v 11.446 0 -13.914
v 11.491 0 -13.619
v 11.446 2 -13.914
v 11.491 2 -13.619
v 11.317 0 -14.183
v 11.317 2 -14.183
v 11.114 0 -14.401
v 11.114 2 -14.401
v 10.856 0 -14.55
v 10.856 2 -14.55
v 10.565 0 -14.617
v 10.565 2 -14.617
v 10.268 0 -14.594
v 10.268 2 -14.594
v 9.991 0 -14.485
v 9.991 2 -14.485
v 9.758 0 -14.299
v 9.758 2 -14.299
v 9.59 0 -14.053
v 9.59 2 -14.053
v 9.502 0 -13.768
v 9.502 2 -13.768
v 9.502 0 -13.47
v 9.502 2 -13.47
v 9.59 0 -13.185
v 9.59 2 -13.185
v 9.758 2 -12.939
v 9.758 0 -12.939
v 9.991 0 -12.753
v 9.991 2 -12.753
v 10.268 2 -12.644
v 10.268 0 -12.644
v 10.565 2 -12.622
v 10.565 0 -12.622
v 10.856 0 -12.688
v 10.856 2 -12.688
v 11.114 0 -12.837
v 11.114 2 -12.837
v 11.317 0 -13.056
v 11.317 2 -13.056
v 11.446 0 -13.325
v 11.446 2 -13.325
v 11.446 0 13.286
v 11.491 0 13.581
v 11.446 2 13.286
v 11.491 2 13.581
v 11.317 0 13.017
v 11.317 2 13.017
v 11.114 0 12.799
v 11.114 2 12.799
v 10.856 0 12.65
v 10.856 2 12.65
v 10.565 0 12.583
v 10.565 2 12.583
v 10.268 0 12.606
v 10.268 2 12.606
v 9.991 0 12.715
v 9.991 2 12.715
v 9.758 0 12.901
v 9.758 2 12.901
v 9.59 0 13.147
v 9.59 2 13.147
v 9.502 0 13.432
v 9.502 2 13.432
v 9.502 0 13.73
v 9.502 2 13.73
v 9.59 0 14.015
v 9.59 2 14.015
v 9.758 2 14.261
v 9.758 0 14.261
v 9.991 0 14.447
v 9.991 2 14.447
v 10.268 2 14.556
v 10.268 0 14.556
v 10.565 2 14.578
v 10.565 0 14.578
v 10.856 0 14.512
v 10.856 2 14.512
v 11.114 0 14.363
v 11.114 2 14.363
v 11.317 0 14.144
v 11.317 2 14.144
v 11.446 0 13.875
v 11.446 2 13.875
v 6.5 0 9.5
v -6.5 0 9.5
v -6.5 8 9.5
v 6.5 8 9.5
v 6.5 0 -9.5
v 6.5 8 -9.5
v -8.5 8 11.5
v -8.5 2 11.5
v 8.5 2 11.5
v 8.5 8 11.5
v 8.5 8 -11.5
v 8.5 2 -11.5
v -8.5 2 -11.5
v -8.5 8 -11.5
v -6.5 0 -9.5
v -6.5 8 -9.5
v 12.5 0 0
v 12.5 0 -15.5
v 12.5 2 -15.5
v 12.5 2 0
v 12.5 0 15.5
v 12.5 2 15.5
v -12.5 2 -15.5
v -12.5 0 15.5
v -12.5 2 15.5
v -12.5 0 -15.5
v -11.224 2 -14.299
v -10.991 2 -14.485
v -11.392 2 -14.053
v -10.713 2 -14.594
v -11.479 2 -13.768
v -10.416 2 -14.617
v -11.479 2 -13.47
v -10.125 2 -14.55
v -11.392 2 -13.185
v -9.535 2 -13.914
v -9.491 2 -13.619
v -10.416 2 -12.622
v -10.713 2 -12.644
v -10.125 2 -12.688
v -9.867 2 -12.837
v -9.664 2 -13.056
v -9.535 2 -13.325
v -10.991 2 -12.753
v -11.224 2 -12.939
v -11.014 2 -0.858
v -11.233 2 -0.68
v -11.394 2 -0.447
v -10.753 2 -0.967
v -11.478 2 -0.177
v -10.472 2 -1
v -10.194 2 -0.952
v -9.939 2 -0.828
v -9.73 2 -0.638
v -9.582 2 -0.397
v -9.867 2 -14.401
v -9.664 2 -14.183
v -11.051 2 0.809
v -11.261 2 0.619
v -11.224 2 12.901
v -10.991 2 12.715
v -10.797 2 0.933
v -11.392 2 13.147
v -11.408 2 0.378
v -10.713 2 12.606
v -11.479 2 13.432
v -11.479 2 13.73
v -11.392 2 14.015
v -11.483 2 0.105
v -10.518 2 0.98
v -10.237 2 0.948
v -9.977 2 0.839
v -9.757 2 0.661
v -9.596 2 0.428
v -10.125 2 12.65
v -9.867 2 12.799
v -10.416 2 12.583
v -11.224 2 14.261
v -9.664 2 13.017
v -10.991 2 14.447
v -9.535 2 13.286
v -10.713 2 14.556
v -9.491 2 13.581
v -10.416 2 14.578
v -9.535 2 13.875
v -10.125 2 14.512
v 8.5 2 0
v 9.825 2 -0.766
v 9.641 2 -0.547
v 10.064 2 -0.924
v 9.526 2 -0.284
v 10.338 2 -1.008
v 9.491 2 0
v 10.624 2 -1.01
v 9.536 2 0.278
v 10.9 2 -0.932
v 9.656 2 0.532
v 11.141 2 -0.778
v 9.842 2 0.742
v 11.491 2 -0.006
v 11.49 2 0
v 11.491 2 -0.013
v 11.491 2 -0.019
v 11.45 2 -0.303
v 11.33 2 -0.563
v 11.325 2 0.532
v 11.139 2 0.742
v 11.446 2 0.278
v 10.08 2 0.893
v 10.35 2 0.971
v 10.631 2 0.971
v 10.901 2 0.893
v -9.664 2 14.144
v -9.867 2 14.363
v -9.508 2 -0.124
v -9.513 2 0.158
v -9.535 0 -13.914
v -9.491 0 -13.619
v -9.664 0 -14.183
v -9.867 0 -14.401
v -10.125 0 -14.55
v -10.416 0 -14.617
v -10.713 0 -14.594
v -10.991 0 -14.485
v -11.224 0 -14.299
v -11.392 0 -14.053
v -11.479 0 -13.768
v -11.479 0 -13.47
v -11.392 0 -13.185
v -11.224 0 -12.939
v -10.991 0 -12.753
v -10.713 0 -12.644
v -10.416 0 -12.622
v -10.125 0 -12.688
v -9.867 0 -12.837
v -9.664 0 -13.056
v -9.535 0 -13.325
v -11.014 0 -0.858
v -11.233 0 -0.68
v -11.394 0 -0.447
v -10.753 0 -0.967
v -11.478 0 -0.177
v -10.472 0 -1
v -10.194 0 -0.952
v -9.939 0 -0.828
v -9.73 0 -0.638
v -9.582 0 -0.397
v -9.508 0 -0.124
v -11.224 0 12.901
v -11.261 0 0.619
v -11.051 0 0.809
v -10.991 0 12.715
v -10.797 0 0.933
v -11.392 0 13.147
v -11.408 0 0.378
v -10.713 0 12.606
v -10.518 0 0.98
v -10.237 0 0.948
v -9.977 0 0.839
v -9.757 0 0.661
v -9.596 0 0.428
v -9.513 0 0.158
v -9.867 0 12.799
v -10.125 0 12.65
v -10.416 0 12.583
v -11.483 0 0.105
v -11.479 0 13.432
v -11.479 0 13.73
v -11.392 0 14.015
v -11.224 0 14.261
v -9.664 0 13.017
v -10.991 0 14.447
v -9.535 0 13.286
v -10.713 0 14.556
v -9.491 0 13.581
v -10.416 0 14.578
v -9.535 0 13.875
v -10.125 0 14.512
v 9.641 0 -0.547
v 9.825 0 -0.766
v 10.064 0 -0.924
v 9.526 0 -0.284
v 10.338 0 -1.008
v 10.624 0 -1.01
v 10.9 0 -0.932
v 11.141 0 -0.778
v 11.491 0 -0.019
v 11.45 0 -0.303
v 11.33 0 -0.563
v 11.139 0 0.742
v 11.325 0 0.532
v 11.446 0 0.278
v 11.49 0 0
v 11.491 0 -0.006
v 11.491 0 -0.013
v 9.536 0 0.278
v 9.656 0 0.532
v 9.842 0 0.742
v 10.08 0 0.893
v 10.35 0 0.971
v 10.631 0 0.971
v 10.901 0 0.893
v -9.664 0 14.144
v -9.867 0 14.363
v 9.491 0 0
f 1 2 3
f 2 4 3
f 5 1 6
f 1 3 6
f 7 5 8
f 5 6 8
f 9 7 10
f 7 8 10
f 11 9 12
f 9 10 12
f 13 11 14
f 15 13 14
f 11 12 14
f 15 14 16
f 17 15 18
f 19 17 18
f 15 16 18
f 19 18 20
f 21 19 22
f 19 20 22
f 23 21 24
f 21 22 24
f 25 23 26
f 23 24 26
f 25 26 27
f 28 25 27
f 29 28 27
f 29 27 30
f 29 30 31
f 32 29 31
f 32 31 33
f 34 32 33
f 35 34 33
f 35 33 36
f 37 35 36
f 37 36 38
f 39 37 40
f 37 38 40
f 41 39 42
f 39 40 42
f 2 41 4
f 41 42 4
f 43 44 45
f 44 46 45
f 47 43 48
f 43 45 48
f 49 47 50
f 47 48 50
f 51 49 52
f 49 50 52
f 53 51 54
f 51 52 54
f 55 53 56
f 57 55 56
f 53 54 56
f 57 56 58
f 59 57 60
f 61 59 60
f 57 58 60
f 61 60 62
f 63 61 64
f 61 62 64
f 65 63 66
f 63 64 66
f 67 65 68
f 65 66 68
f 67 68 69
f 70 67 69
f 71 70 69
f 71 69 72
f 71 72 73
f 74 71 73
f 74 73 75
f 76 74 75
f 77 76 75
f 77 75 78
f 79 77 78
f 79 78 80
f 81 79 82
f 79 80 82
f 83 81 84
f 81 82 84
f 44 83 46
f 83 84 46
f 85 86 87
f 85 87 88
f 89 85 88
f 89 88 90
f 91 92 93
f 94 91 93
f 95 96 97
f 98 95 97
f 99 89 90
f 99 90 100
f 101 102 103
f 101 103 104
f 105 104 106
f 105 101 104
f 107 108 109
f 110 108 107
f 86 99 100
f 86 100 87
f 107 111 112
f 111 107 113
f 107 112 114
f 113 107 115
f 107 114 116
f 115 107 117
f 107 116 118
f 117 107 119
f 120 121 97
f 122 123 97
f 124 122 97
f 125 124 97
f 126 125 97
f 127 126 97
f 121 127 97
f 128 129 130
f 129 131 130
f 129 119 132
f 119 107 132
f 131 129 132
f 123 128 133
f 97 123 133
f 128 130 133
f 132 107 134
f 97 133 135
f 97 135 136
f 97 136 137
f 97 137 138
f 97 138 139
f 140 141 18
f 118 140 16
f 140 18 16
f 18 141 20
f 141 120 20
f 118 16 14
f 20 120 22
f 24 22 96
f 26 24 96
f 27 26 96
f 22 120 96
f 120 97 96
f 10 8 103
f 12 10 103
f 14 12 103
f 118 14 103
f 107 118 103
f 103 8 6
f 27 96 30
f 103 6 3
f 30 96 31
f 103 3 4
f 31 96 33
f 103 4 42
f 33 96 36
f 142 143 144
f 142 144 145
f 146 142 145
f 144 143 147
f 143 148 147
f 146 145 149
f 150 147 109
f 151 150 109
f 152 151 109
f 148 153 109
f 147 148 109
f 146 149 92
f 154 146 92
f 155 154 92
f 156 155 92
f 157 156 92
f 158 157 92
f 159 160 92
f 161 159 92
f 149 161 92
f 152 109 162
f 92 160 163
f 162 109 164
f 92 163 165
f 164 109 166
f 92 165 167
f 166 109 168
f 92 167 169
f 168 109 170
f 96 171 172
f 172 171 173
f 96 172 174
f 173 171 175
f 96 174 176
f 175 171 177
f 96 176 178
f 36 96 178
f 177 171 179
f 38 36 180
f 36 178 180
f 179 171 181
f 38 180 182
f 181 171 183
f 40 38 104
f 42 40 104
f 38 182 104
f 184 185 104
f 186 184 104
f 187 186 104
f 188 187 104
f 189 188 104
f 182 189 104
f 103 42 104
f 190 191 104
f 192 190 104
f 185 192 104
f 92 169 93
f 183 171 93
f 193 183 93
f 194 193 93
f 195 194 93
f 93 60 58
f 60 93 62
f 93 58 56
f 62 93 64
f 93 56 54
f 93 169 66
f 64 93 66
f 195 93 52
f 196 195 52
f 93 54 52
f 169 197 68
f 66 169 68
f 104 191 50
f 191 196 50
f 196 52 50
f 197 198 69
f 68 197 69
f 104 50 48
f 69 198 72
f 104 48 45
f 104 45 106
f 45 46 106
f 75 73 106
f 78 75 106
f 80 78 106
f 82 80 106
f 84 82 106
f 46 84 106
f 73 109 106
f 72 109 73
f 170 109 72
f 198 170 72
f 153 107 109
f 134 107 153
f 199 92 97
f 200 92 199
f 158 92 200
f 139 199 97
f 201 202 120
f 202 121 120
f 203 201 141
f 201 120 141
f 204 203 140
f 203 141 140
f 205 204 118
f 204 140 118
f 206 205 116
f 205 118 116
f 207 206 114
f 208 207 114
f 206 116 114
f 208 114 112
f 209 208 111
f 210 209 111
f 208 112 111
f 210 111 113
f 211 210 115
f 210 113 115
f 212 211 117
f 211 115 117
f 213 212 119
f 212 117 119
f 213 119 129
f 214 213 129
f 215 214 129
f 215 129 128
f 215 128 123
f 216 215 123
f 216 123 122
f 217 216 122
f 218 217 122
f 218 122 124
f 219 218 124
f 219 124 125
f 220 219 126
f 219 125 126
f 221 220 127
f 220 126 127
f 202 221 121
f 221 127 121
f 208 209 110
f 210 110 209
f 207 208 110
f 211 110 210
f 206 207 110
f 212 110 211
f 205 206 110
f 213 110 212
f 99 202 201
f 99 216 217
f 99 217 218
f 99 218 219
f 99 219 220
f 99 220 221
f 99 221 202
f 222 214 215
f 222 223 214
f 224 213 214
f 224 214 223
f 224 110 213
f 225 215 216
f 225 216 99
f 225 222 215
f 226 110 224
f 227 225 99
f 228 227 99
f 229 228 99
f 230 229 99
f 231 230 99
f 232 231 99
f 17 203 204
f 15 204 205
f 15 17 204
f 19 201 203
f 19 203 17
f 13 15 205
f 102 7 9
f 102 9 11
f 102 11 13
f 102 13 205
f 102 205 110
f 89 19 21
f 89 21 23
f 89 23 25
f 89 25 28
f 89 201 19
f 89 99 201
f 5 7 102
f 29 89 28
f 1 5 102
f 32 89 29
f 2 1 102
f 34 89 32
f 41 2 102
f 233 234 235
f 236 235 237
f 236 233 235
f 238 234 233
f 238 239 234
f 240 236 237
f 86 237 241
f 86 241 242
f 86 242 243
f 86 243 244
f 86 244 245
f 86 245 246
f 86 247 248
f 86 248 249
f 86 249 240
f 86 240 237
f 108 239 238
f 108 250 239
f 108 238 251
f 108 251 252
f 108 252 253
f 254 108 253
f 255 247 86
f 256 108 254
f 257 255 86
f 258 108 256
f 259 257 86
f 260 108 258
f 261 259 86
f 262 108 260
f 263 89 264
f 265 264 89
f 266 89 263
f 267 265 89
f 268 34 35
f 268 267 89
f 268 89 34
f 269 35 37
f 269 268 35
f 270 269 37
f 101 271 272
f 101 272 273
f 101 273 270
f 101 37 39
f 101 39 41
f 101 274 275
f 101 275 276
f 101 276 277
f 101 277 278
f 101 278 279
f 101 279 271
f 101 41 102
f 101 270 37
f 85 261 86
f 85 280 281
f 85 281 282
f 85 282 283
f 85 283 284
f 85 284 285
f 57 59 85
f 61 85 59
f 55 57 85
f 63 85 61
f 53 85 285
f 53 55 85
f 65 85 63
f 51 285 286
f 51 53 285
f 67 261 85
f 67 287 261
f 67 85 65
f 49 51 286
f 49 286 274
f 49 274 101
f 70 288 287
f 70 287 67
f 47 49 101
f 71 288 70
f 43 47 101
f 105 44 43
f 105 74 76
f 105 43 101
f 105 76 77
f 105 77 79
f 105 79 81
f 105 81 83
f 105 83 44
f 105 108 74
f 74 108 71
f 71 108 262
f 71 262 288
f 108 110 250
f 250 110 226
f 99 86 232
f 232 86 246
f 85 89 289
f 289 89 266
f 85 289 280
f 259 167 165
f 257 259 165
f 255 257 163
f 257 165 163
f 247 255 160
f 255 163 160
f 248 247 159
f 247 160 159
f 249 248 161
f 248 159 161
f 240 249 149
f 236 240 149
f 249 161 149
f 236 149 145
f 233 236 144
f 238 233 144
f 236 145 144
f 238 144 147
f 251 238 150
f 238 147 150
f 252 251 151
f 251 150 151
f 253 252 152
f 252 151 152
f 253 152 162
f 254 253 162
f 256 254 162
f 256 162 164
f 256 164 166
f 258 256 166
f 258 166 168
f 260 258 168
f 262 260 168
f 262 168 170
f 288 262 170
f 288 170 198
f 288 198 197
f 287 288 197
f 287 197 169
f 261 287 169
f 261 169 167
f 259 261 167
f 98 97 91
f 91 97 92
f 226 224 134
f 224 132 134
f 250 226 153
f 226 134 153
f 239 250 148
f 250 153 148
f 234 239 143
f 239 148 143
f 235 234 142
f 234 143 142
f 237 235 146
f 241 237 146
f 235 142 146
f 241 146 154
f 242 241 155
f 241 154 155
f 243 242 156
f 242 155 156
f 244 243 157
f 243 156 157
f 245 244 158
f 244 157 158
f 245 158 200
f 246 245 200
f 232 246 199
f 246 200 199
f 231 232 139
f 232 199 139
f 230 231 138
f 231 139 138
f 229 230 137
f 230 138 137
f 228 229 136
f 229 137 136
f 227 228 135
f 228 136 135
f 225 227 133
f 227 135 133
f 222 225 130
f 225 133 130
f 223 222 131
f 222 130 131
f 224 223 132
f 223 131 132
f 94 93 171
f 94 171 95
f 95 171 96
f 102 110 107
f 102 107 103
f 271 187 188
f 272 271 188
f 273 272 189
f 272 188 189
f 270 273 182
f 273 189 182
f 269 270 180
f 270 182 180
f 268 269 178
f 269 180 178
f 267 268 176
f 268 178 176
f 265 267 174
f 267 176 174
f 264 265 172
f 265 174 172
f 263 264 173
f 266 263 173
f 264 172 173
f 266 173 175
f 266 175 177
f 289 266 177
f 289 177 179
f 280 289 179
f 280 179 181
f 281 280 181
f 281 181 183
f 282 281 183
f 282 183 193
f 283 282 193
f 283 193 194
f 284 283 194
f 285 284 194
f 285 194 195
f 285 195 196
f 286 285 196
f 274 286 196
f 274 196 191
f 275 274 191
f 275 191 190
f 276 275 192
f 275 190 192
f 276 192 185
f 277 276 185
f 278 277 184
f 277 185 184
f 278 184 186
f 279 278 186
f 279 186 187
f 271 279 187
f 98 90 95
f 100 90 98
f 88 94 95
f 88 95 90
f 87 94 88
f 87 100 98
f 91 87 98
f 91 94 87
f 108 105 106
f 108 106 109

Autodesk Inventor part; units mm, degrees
ref_plane "YZ Plane" through (0, 0, 0) normal (1, 0, 0) x (0, 1, 0)
ref_plane "XZ Plane" through (0, 0, 0) normal (0, 1, 0) x (-1, 0, 0)
ref_plane "XY Plane" through (0, 0, 0) normal (0, 0, 1) x (1, 0, 0)
sketch "Sketch1" plane through (0, 0, 0) normal (0, 1, 0) x (-1, 0, 0)
  line L0 (-6.5, -9.5) -> (6.5, -9.5)
  line L1 (6.5, -9.5) -> (6.5, 9.5)
  line L2 (6.5, 9.5) -> (-6.5, 9.5)
  line L3 (-6.5, 9.5) -> (-6.5, -9.5)
  line L4 (-6.5, -9.5) -> (6.5, 9.5) construction
  line L5 (6.5, -9.5) -> (-6.5, 9.5) construction
  line L6 (-8.5, -11.5) -> (8.5, -11.5)
  line L7 (8.5, -11.5) -> (8.5, 11.5)
  line L8 (8.5, 11.5) -> (-8.5, 11.5)
  line L9 (-8.5, 11.5) -> (-8.5, -11.5)
  line L10 (-8.5, -11.5) -> (8.5, 11.5) construction
  line L11 (8.5, -11.5) -> (-8.5, 11.5) construction
  point P0 (0, 0)
  dimension "d0" = 13
  dimension "d1" = 19
  dimension "d2" = 17
  dimension "d3" = 23
extrude "Extrusion1" add sketch "Sketch1" along normal blind 8
sketch "Sketch2" plane through (0, 0, 0) normal (0, -1, 0) x (1, 0, 0)
  line L0 (8.5, 11.5) -> (8.5, -11.5) projected
  line L1 (-8.5, 11.5) -> (8.5, 11.5) projected
  line L2 (-8.5, -11.5) -> (-8.5, 11.5) projected
  line L3 (8.5, -11.5) -> (-8.5, -11.5) projected
  line L4 (-6.5, 9.5) -> (-6.5, -9.5) projected
  line L5 (6.5, 9.5) -> (-6.5, 9.5) projected
  line L6 (6.5, -9.5) -> (6.5, 9.5) projected
  line L7 (-6.5, -9.5) -> (6.5, -9.5) projected
  line L8 (-6.5, 9.5) -> (-6.5, -9.5) projected
  line L9 (6.5, 9.5) -> (-6.5, 9.5)
  line L10 (-6.5, 9.5) -> (-6.5, -9.5)
  line L11 (-6.5, -9.5) -> (6.5, -9.5)
  line L12 (6.5, -9.5) -> (6.5, 9.5)
  line L13 (6.5, 9.5) -> (-6.5, 9.5) projected
  line L14 (-6.5, -9.5) -> (6.5, -9.5) projected
  line L15 (6.5, -9.5) -> (6.5, 9.5) projected
  line L16 (6.5, 0) -> (12.5, 0)
  line L17 (12.5, 15.5) -> (-12.5, 15.5)
  line L18 (-12.5, 15.5) -> (-12.5, -15.5)
  line L19 (-12.5, -15.5) -> (12.5, -15.5)
  line L20 (12.5, -15.5) -> (12.5, 15.5)
  point P0 (0, 0)
  dimension "d9" = 25
extrude "Extrusion2" add sketch "Sketch2" against normal blind 2 contours L20 L19 L18 L17
sketch "Sketch3" plane through (0, 2, 0) normal (0, 1, 0) x (1, 0, 0)
  circle A0 centre (-10.4906, -13.5807) radius 1
  circle A1 centre (-10.5, 0) radius 1
  line L0 (-12.5, 15.5) -> (-12.5, -15.5) projected
  line L1 (-12.5, -15.5) -> (-12.5, 15.5)
  line L2 (-12.5, -15.5) -> (12.5, -15.5)
  circle A2 centre (-10.4906, 0.0193) radius 1
  circle A3 centre (-10.4906, 13.6193) radius 1
  line L3 (12.5, 15.5) -> (-12.5, 15.5) projected
  circle A4 centre (10.4906, -13.5807) radius 1
  circle A5 centre (10.4906, 0.0193) radius 1
  circle A6 centre (10.4906, 13.6193) radius 1
  point P0 (0, 0)
  point P1 (-11.3944, 0.4472)
  point P2 (-9.5962, -0.4279)
  dimension "d12" = 2
  dimension "d20" = 13.6
extrude "Extrusion3" cut sketch "Sketch3" against normal blind 2 contours A0 | A1 A2 | A3 | A4 | A5 | A6 picked at (-10.303, 0.2798)
properties part number "TipkaloDrzac_v.1.0"
